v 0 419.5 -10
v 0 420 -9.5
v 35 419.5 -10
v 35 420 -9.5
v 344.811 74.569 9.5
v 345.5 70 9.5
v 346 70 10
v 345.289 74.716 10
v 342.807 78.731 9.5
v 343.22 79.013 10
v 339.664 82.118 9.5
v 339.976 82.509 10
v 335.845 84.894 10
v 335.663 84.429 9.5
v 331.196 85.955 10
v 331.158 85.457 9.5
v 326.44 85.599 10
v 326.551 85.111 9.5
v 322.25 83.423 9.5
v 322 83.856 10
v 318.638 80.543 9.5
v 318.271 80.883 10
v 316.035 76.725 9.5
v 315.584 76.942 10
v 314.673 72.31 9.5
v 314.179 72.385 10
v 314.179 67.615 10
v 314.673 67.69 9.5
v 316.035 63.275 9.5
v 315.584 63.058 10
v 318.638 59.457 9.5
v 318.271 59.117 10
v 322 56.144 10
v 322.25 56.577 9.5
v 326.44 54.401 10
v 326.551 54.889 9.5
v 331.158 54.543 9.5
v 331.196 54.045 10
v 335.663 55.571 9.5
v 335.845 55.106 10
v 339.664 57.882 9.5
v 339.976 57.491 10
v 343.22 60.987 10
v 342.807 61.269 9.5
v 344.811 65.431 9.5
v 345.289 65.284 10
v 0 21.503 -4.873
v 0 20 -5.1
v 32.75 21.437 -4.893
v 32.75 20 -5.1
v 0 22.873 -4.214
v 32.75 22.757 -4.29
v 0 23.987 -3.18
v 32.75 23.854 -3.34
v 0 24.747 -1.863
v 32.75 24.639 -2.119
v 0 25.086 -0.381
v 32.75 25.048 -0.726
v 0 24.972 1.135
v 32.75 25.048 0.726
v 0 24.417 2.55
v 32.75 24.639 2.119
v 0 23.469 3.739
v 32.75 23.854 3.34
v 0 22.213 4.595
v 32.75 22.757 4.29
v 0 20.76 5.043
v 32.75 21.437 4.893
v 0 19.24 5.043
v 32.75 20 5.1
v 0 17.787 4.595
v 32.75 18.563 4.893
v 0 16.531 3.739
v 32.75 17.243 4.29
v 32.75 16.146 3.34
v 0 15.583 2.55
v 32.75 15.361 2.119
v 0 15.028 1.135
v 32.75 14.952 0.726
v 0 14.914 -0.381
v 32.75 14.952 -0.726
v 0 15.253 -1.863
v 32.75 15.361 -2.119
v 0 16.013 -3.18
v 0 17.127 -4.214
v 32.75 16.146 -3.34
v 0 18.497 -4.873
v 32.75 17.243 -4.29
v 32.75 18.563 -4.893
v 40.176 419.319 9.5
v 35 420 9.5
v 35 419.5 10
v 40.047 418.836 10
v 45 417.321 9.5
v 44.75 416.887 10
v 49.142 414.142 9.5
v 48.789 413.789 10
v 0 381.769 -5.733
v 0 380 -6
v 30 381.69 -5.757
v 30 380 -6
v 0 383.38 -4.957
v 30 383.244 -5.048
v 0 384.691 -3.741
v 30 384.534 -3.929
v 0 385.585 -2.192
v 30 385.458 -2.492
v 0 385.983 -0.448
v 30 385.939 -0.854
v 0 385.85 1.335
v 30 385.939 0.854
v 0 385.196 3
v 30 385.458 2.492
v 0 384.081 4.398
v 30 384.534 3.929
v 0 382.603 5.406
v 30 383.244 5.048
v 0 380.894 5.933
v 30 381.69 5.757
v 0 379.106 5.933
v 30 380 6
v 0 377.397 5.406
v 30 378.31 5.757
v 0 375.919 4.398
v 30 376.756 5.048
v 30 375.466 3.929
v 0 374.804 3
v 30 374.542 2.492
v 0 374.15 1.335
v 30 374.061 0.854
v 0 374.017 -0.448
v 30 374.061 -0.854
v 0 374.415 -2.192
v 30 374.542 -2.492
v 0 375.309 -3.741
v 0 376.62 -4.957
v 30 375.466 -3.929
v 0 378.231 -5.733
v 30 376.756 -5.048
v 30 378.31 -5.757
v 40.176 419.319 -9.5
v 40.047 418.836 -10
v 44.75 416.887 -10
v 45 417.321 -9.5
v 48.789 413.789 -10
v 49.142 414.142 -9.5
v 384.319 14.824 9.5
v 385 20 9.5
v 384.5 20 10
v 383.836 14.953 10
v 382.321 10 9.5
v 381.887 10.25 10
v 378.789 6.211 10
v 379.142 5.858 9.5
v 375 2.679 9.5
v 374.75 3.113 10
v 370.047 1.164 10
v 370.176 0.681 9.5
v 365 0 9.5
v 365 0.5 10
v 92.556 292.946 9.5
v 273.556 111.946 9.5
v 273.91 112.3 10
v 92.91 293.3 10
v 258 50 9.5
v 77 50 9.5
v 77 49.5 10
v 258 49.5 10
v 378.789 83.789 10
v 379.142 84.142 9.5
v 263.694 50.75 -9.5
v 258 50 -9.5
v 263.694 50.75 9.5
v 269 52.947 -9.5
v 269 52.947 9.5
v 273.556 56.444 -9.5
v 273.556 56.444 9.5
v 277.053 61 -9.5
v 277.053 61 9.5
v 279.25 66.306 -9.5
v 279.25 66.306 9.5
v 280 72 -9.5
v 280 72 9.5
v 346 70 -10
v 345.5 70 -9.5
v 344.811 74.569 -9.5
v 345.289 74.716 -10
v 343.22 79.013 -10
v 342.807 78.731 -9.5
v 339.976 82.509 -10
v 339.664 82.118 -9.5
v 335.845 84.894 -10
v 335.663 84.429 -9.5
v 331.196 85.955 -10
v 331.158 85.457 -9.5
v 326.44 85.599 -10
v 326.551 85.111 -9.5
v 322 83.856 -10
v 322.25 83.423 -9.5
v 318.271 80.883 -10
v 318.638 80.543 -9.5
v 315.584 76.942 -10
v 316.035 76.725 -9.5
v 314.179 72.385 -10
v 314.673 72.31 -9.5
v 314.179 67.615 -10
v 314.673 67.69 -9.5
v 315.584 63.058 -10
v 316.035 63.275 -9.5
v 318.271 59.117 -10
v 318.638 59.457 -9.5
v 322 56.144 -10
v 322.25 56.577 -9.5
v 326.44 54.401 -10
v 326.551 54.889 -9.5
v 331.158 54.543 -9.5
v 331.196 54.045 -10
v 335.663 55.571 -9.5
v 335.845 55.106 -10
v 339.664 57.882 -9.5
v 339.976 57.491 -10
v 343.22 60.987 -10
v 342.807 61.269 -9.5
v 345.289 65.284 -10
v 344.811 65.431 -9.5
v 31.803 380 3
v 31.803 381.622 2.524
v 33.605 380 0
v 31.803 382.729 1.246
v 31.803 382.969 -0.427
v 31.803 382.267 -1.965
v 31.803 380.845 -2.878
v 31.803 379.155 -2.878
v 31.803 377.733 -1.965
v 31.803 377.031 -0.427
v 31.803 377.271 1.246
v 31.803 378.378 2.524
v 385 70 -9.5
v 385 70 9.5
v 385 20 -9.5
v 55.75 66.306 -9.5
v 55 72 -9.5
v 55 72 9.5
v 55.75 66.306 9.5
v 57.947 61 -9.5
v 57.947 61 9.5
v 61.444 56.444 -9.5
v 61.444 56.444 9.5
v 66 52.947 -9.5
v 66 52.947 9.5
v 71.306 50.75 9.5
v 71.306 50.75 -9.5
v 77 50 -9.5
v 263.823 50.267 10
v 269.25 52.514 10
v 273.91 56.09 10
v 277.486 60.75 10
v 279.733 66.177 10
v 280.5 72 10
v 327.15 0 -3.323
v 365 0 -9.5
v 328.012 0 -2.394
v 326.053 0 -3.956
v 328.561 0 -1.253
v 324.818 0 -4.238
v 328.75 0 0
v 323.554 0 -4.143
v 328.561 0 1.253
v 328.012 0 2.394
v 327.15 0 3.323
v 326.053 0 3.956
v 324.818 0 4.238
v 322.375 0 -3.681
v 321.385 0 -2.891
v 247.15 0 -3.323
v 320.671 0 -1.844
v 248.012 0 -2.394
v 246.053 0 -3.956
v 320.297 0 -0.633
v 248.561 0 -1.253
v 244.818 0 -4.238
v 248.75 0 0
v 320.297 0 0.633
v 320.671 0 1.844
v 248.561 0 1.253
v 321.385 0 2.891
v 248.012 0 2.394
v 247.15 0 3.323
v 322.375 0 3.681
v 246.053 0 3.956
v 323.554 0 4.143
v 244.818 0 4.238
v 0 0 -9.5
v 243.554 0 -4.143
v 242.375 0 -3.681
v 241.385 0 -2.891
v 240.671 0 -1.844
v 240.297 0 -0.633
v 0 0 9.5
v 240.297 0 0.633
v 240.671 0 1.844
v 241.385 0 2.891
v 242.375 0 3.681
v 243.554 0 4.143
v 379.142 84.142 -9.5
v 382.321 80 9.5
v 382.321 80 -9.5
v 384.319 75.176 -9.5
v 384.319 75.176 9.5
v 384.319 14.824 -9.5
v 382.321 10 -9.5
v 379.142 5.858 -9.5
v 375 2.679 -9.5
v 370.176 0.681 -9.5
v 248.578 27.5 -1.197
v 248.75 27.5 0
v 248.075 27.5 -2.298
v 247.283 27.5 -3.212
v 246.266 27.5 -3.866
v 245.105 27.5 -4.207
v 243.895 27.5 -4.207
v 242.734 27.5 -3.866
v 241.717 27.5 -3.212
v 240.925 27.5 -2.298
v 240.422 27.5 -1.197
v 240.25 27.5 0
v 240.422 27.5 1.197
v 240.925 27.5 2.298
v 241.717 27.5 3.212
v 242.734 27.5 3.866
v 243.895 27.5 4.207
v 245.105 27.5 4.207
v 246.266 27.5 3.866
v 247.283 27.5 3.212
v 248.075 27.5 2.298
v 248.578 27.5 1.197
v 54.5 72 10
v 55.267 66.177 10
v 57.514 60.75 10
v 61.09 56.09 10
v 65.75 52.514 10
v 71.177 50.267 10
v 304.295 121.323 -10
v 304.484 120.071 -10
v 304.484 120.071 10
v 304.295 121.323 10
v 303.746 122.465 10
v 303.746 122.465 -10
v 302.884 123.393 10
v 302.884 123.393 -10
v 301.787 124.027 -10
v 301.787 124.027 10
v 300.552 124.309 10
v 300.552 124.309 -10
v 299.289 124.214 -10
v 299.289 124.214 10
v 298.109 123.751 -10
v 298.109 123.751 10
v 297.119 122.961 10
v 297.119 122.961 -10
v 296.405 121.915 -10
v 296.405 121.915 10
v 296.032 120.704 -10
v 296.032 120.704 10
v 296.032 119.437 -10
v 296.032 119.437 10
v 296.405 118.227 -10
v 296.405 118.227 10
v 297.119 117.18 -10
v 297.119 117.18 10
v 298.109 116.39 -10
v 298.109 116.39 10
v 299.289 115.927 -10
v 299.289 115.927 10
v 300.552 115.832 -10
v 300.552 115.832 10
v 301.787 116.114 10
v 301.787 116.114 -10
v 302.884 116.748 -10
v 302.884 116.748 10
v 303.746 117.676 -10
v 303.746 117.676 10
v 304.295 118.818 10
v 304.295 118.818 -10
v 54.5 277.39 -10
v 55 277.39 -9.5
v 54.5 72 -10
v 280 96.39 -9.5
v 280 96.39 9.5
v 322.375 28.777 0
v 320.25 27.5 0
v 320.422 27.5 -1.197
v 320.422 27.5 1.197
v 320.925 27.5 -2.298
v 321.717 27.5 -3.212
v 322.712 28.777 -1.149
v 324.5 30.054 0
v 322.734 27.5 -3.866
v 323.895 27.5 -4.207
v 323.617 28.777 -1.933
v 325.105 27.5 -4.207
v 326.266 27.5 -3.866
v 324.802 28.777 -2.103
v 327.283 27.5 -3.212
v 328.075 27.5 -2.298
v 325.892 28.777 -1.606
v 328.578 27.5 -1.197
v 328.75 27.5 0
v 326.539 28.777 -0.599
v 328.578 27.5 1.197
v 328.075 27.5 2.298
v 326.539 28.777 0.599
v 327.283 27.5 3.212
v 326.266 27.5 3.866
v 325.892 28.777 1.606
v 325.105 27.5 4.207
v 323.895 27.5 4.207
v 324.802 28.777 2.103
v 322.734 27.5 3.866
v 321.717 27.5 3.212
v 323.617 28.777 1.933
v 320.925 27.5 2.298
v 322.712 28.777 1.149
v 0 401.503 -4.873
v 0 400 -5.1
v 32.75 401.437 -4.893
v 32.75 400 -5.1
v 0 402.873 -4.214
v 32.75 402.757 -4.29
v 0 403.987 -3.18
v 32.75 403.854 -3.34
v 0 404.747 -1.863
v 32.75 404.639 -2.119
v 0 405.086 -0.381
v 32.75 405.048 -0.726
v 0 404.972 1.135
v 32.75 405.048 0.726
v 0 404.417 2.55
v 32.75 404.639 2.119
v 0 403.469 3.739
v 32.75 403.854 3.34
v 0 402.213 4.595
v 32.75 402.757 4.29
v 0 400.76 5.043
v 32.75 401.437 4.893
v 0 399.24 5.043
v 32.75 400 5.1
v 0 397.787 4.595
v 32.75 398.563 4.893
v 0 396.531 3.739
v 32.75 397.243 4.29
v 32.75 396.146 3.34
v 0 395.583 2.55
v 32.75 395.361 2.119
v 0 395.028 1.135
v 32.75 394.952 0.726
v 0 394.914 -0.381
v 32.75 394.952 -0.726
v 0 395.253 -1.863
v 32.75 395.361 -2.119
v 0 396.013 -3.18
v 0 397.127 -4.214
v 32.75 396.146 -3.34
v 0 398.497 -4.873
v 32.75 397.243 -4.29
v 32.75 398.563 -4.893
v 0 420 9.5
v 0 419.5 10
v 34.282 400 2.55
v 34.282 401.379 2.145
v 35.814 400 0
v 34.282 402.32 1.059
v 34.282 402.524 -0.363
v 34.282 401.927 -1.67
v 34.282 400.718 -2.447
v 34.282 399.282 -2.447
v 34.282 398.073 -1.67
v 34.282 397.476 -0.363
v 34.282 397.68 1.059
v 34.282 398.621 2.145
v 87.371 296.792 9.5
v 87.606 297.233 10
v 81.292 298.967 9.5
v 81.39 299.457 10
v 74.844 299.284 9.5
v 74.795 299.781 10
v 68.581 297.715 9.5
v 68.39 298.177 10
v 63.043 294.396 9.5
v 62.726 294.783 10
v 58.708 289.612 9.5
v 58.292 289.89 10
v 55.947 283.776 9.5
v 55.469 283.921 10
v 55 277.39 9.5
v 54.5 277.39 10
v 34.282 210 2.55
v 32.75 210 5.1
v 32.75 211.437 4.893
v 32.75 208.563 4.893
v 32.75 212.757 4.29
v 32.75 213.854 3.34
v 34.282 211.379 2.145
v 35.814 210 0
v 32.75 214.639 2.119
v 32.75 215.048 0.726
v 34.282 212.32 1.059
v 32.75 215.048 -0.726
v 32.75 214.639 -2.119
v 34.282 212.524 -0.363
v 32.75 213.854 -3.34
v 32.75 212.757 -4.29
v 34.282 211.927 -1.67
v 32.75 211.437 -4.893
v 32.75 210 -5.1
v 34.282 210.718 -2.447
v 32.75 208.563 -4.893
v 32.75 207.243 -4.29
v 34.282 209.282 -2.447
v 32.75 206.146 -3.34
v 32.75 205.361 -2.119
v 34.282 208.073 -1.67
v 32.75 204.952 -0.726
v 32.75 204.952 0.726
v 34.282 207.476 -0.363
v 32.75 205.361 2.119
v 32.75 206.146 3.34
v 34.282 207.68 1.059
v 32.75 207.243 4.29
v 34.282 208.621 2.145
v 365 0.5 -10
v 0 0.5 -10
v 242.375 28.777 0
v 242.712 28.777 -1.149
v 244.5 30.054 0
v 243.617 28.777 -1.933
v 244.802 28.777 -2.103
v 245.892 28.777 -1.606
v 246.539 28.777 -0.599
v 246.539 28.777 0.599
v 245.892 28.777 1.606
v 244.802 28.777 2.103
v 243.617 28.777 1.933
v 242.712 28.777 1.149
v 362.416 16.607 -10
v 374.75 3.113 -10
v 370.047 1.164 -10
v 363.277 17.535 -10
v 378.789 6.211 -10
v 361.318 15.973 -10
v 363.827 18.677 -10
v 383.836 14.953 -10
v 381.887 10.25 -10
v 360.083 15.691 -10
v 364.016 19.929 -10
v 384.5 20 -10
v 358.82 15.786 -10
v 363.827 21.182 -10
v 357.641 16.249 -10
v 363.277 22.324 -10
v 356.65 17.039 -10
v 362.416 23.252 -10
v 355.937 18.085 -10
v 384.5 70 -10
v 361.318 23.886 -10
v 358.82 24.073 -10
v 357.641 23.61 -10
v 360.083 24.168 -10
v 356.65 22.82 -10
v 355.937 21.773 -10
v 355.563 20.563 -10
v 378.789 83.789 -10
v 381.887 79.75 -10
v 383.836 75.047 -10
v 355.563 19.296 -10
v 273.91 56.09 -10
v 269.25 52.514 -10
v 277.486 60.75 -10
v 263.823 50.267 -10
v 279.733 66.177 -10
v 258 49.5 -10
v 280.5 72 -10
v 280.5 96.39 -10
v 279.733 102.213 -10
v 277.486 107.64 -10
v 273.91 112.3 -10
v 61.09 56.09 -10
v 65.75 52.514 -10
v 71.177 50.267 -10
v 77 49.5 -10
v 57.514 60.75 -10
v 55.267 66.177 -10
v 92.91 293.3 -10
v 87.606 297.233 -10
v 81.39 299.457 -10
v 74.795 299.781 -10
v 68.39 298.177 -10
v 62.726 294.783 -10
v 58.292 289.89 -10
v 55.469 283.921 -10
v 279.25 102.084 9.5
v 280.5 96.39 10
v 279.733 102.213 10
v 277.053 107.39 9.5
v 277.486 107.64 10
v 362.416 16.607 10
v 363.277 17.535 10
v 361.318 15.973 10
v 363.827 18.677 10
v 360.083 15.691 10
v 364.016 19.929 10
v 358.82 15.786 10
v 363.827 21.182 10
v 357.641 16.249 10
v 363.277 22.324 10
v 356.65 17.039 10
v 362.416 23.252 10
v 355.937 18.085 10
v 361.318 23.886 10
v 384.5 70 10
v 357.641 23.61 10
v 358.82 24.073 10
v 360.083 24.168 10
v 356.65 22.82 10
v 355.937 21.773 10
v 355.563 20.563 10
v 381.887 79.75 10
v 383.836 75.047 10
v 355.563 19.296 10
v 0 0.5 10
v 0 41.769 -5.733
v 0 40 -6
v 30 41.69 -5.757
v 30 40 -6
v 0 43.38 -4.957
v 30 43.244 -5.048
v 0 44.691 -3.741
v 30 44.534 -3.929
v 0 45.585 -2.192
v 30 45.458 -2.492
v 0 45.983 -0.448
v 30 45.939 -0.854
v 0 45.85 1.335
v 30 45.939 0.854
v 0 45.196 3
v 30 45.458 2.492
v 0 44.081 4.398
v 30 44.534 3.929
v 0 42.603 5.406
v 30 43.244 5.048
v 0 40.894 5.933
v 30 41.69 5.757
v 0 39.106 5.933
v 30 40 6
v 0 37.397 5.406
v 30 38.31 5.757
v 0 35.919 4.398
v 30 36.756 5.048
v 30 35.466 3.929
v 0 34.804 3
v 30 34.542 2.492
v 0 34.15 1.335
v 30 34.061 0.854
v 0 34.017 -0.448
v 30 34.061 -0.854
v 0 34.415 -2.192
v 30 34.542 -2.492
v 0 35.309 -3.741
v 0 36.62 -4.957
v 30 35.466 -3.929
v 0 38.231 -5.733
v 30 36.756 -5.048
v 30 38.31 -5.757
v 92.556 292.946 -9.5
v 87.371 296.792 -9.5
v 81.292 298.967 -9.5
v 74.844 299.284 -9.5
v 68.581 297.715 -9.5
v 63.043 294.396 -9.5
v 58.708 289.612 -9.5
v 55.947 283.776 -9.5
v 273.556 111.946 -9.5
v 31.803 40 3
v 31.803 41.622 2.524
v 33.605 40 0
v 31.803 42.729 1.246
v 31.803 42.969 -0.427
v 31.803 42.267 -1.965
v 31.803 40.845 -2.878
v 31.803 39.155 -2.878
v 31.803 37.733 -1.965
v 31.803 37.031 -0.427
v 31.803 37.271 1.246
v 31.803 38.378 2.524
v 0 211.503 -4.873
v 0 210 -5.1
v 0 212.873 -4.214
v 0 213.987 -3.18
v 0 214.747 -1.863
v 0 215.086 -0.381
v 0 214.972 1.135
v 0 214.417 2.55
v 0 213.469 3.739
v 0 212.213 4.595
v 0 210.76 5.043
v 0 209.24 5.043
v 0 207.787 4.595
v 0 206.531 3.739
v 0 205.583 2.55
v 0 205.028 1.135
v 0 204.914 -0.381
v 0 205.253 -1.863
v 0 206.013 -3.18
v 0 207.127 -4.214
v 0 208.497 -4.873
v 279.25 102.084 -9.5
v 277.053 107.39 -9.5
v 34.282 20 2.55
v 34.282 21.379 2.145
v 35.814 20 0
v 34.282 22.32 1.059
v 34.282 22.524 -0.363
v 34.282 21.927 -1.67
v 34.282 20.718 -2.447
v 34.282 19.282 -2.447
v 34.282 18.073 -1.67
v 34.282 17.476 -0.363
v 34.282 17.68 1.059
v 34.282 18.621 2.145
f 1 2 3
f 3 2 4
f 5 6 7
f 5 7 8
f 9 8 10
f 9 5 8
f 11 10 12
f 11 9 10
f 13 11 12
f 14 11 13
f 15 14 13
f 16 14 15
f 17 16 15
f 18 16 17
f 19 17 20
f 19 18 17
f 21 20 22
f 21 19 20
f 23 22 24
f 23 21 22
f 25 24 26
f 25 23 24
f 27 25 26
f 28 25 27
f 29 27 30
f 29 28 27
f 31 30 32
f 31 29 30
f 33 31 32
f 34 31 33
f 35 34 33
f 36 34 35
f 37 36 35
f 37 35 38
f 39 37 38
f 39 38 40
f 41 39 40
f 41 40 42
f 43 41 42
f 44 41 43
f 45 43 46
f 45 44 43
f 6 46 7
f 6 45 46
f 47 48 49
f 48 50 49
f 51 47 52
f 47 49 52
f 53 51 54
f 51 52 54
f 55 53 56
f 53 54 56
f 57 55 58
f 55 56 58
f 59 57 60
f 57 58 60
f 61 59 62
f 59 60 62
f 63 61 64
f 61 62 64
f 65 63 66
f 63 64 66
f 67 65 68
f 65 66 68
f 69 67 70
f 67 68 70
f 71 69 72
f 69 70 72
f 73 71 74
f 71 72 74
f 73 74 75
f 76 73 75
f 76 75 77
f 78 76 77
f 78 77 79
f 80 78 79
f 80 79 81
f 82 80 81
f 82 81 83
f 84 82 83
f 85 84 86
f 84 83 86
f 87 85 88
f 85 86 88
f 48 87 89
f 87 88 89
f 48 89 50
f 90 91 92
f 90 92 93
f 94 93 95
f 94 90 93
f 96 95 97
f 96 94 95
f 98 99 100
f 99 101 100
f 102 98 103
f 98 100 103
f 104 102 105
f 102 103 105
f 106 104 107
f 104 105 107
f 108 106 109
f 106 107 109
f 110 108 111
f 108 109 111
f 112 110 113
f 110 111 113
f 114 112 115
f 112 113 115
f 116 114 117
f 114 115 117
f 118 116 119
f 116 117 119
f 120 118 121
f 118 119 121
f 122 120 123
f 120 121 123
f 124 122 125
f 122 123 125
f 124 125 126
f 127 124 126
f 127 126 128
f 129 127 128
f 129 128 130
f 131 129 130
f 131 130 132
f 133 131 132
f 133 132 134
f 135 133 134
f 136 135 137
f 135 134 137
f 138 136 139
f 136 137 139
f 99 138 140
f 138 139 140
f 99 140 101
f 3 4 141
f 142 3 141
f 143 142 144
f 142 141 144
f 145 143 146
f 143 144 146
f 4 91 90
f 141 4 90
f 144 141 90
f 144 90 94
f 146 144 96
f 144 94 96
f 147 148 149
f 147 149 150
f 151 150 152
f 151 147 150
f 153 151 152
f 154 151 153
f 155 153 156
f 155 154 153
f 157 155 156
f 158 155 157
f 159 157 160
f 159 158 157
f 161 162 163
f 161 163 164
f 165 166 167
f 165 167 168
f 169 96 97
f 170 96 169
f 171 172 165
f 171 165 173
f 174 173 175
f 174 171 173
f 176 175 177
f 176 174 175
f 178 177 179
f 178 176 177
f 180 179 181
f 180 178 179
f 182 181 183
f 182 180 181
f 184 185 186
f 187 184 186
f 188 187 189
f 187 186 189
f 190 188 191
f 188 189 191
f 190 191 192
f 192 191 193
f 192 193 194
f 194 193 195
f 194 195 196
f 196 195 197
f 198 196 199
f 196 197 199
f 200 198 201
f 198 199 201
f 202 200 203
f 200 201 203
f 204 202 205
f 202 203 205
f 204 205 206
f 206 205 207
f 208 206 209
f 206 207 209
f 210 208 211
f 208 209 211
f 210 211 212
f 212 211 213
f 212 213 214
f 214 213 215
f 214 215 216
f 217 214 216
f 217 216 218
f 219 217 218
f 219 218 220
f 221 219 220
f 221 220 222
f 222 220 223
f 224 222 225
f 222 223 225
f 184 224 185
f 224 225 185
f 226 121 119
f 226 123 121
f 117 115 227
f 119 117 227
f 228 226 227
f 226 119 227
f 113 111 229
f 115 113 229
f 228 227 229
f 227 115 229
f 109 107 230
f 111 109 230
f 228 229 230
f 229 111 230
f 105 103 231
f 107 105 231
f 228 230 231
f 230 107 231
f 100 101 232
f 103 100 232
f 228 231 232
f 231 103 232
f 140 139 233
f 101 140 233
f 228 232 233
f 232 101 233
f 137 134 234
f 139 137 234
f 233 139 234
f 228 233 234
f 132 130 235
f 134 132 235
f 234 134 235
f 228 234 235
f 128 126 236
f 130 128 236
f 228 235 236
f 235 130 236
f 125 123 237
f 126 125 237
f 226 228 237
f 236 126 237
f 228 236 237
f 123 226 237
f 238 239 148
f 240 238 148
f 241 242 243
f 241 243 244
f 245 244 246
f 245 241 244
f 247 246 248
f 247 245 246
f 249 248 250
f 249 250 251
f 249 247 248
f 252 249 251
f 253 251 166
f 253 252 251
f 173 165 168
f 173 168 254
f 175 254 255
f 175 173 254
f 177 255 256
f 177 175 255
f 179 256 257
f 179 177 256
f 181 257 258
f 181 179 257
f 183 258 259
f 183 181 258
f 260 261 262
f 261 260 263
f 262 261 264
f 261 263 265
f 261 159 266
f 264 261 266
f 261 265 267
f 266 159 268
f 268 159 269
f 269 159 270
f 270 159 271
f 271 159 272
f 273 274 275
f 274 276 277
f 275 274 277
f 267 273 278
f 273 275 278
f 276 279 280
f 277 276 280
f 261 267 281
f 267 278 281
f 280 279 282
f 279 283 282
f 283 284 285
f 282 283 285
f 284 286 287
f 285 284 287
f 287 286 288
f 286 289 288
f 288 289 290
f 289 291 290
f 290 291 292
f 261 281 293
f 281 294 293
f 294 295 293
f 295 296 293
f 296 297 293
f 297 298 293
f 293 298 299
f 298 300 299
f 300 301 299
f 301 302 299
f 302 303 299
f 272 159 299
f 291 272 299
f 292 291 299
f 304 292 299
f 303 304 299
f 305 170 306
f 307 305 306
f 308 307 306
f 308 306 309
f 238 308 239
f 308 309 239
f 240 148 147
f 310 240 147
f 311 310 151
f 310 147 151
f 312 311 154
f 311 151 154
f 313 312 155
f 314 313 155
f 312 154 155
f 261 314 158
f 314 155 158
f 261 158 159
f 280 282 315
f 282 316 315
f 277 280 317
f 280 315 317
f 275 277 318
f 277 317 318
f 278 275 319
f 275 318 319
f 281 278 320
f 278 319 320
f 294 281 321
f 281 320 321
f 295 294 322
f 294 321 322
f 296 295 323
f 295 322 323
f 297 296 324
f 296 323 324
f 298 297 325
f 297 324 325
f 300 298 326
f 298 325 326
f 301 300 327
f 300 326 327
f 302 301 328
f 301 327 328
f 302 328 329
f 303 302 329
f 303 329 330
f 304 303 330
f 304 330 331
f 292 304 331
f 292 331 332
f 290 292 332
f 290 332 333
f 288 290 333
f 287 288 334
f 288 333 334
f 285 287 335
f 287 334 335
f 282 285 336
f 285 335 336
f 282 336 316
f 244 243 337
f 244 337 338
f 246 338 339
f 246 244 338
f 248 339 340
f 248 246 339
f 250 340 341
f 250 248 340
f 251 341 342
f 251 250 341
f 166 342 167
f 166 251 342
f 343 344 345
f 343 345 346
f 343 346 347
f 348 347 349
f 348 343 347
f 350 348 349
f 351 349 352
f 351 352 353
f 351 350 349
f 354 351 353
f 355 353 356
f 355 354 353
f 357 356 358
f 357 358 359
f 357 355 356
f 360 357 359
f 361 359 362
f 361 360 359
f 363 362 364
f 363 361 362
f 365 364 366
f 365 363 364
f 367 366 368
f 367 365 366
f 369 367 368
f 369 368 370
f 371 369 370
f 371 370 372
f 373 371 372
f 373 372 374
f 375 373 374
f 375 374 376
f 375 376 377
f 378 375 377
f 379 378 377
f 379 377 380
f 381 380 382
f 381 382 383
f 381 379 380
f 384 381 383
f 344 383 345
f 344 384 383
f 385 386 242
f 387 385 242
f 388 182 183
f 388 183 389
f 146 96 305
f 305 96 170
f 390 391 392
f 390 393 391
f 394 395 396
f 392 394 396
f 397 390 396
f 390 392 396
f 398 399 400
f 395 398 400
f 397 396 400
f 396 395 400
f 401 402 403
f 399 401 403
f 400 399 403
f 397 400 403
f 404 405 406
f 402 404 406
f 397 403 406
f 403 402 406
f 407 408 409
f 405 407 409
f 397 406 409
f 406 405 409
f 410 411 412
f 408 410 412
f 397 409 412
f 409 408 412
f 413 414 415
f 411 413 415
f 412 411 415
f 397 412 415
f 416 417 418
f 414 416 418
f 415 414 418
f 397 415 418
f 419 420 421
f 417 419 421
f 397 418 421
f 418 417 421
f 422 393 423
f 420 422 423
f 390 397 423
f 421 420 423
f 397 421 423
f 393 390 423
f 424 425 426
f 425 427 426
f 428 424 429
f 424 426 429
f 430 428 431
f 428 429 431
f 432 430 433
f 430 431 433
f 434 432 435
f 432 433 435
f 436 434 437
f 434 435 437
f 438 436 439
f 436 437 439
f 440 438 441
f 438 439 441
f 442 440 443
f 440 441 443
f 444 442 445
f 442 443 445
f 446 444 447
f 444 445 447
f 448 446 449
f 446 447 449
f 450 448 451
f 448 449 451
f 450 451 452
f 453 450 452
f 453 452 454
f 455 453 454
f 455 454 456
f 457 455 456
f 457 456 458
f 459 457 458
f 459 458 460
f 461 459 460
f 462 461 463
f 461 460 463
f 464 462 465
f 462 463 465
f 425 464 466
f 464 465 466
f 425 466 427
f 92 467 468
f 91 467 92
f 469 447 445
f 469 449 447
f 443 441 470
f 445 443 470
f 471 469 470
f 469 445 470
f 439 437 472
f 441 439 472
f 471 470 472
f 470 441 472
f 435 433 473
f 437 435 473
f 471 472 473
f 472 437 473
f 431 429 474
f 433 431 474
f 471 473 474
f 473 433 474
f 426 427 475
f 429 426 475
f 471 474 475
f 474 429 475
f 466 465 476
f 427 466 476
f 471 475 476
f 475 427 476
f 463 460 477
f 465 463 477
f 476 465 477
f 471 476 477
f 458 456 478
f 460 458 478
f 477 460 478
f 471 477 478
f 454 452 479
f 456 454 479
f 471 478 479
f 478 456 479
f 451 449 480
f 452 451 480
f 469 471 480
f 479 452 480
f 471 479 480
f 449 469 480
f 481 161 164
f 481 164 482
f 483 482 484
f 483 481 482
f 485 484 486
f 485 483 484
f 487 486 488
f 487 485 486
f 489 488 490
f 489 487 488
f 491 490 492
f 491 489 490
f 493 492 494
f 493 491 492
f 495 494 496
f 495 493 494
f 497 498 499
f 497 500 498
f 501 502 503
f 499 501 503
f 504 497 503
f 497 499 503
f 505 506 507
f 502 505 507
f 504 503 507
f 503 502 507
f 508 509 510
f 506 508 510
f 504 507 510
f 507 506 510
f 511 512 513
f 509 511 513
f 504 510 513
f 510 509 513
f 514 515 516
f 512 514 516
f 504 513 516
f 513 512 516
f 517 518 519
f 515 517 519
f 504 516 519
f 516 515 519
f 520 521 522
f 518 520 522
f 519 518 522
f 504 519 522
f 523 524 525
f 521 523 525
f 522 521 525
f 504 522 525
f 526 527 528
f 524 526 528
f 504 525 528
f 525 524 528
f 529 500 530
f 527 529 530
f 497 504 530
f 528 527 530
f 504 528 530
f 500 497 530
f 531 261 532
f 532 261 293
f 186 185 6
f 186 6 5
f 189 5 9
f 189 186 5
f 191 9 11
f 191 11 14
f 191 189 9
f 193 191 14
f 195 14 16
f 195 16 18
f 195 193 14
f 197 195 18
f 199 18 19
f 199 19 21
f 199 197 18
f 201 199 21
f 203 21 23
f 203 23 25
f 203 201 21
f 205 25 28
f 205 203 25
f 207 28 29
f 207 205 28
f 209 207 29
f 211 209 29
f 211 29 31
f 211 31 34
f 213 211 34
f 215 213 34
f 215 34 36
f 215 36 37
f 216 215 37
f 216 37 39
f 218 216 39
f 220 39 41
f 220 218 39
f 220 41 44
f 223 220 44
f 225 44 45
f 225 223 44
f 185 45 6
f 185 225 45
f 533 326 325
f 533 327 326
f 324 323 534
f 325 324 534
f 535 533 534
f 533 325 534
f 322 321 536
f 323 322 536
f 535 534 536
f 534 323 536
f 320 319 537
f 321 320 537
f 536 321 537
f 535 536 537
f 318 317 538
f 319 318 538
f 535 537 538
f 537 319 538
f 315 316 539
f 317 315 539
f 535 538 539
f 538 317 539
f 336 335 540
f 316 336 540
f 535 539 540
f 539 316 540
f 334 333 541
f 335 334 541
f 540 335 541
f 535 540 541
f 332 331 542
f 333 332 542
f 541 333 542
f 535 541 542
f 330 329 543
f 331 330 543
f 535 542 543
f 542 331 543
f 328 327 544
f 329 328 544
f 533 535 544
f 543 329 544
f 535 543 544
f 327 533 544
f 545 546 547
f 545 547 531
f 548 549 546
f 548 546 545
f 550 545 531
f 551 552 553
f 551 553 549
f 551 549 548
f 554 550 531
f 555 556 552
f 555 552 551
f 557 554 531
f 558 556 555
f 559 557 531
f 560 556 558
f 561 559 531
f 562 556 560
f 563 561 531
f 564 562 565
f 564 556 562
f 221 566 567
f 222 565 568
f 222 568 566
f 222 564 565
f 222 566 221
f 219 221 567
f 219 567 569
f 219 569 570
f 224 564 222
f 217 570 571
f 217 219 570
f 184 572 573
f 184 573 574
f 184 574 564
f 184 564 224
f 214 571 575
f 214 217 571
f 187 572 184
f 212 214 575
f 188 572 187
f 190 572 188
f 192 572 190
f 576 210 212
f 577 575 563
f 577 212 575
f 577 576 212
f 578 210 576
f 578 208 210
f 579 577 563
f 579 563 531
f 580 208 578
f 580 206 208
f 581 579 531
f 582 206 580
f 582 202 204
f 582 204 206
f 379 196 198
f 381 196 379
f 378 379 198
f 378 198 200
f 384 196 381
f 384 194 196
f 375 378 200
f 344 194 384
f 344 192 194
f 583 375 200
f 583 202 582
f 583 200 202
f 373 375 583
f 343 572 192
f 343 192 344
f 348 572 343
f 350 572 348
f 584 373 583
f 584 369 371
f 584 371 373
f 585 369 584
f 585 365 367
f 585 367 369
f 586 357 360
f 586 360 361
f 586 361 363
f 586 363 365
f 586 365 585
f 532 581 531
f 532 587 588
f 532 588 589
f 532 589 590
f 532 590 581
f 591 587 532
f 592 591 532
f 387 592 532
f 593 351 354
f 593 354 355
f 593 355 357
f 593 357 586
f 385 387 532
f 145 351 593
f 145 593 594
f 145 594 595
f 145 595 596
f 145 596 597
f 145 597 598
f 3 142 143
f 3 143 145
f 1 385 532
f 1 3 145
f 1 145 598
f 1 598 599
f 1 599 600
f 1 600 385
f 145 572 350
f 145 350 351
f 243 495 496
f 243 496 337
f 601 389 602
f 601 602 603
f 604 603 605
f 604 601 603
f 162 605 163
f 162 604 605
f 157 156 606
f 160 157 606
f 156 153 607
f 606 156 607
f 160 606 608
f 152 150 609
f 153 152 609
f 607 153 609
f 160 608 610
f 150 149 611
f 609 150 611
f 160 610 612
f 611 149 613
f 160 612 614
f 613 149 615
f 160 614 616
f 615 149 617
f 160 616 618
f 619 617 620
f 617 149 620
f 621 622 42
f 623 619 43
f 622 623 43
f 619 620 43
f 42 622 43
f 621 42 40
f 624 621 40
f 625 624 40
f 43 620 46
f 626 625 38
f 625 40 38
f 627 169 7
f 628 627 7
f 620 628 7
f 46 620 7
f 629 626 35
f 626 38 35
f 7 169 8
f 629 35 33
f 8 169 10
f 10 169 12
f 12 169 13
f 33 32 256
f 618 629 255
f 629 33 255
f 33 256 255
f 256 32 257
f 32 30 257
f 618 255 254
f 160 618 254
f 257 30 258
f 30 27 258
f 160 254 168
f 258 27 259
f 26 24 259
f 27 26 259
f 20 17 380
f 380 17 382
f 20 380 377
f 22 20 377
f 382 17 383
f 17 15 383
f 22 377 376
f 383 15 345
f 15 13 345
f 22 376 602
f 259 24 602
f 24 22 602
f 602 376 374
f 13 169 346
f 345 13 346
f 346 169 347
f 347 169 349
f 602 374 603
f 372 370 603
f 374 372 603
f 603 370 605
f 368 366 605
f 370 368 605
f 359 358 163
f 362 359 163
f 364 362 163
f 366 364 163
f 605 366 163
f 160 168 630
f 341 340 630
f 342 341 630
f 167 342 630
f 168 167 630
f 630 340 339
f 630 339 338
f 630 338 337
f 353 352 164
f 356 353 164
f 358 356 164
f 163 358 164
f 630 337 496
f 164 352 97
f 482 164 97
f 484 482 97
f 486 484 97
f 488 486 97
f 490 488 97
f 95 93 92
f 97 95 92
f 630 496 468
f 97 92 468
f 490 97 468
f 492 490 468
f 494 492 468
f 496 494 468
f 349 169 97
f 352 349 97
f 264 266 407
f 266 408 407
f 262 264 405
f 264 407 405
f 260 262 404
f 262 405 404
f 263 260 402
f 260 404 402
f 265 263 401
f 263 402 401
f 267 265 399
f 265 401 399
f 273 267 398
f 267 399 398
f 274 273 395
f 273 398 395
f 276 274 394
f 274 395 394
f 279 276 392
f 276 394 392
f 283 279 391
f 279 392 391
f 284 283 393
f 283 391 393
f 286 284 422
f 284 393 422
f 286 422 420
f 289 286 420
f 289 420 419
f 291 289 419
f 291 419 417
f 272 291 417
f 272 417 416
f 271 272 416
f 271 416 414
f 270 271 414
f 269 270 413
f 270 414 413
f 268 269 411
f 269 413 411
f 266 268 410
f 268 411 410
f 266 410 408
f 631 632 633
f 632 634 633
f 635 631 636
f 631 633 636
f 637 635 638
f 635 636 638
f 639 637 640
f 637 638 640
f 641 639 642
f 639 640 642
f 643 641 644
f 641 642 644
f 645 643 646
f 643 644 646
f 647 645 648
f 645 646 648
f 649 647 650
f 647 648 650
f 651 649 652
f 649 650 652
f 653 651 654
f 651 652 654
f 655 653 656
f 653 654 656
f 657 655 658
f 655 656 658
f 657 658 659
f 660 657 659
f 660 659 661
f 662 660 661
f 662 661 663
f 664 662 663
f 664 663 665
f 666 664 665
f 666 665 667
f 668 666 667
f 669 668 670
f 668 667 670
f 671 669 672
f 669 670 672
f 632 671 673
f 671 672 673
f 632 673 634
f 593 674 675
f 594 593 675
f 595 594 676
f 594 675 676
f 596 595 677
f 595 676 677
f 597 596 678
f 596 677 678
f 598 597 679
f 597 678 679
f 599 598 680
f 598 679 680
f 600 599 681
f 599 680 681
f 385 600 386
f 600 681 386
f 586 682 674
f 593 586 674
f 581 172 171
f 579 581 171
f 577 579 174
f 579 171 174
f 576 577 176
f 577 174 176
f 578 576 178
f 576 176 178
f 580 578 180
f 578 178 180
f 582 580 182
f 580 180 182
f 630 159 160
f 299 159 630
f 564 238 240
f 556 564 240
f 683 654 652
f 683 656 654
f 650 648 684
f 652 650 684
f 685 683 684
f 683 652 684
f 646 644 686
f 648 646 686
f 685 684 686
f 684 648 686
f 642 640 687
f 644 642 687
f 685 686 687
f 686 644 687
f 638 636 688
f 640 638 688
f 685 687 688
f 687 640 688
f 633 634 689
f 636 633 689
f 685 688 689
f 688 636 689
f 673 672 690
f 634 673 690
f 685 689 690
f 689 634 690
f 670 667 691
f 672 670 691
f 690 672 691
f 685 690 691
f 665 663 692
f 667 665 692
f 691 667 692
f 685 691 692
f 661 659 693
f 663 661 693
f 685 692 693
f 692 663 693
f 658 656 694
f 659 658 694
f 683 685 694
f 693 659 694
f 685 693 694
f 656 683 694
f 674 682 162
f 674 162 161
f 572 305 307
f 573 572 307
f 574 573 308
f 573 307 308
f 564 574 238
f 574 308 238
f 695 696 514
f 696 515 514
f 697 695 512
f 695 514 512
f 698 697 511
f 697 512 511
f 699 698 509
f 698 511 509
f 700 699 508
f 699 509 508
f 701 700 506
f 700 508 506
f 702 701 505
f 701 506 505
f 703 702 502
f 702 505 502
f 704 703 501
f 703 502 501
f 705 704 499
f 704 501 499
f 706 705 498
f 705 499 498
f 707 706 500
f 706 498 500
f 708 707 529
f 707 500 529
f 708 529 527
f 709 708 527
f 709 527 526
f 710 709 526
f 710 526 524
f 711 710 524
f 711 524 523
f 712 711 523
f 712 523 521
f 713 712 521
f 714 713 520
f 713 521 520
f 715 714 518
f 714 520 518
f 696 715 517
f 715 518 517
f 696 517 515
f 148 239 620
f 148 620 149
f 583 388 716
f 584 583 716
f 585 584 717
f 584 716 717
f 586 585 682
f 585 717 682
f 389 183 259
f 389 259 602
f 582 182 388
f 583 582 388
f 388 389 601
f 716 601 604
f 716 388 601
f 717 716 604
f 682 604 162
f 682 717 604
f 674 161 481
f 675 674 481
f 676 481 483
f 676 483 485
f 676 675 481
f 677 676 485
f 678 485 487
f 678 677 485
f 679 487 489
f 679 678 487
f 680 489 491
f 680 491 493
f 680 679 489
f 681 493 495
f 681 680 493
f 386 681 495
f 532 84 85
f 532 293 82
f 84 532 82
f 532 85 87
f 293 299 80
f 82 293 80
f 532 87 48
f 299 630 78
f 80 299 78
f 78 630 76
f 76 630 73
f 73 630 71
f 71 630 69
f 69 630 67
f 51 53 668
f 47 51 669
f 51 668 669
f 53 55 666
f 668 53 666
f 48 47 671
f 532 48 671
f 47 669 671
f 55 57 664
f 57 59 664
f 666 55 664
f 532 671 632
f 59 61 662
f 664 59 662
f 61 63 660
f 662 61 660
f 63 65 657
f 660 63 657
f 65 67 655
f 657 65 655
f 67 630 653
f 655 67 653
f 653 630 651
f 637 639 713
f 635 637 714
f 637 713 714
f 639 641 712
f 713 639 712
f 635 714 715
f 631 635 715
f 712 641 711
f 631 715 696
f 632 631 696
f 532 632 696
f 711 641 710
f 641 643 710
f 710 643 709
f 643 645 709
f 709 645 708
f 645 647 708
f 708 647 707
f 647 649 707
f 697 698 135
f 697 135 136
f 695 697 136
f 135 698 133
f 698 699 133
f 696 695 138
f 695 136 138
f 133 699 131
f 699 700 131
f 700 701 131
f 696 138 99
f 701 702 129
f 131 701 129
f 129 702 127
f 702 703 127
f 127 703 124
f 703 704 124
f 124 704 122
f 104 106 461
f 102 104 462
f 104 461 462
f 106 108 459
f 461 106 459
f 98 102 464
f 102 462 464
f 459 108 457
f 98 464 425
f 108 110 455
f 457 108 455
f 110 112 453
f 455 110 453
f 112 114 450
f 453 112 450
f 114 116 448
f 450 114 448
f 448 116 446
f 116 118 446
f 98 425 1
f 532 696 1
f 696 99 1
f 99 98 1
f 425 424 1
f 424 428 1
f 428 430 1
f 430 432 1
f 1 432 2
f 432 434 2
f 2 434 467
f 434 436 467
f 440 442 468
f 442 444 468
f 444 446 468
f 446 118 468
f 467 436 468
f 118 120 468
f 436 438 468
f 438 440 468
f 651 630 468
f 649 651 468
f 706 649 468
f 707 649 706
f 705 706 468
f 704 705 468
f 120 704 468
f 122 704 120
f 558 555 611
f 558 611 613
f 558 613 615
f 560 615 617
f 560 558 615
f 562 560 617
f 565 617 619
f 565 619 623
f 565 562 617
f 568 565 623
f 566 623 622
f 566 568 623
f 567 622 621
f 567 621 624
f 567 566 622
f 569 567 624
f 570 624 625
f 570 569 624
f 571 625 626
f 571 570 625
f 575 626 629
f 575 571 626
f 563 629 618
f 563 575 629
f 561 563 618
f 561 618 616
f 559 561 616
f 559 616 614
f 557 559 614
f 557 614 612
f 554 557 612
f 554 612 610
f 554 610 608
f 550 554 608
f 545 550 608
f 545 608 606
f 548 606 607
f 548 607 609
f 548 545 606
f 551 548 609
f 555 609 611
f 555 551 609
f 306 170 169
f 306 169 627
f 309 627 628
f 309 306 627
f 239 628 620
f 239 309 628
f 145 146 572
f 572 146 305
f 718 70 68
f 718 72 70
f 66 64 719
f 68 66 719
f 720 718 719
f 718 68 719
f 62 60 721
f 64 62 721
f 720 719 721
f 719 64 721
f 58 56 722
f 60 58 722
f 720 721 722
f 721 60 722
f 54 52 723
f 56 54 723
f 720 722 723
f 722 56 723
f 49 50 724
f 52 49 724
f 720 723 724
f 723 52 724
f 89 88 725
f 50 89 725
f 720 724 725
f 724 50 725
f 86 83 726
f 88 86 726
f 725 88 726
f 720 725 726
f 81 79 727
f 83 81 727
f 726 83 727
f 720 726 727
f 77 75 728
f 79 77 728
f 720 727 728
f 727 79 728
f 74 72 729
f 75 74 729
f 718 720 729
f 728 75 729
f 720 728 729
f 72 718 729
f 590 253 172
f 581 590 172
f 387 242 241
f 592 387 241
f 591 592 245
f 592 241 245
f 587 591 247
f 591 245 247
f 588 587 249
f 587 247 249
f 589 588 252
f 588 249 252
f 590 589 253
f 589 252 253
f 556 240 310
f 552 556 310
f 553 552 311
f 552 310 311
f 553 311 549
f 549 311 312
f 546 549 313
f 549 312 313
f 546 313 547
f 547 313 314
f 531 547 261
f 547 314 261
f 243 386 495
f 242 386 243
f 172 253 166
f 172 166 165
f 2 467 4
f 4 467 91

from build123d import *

# Parameters (mm, degrees)
AUFSATZ_LINEAR_AUSTRAGEN1_DEPTH      = 10
F_12_0_12_DURCHMESSER_BOHRUNG1_D     = 12
F_12_0_12_DURCHMESSER_BOHRUNG1_DEPTH = 30
F_12_0_12_DURCHMESSER_BOHRUNG1_TIP   = 3.605163714
M12_GEWINDEBOHRUNG1_D                = 10.2
M12_GEWINDEBOHRUNG1_DEPTH            = 32.75
M12_GEWINDEBOHRUNG1_TIP              = 3.064389157
SCHNITT_LINEAR_START                 = -10
SCHNITT_LINEAR_AUSTRAGEN1_OUTLINE_R  = 15.5
SCHNITT_LINEAR_AUSTRAGEN1_DEPTH      = 20
M10_START                            = -10
M10_GEWINDEBOHRUNG1_OUTLINE_R        = 4.25
M10_GEWINDEBOHRUNG1_DEPTH            = 20
M10_GEWINDEBOHRUNG2_D                = 8.5
M10_GEWINDEBOHRUNG2_DEPTH            = 27.5
M10_GEWINDEBOHRUNG2_TIP              = 2.553657631
FASE1_SIZE                           = 0.5


# Read off the part's stored shape, not the designer's step: Schnitt-Linear austragen1, M10 Gewindebohrung1
with BuildPart() as part:
    # Skizze1 → Aufsatz-Linear austragen1 (new, symmetric)
    with BuildSketch(Plane.XY):
        with BuildLine():
            Line((0, 0), (0, 420))
            Line((0, 420), (35, 420))
            ThreePointArc((35, 420), (42.653668647, 418.47759065), (49.142135624, 414.142135624))
            Line((49.142135624, 414.142135624), (379.142135624, 84.142135624))
            ThreePointArc((379.142135624, 84.142135624), (383.47759065, 77.653668647), (385, 70))
            Line((385, 70), (385, 20))
            ThreePointArc((385, 20), (379.142135624, 5.857864376), (365, 0))
            Line((365, 0), (0, 0))
        make_face()
    extrude(amount=AUFSATZ_LINEAR_AUSTRAGEN1_DEPTH, both=True)

    # Ø12.0 (12) Durchmesser Bohrung1
    with Locations(Plane.ZY):
        with Locations((0, 40), (0, 380)):
            Hole(F_12_0_12_DURCHMESSER_BOHRUNG1_D / 2, depth=F_12_0_12_DURCHMESSER_BOHRUNG1_DEPTH)
            with Locations((0, 0, -(F_12_0_12_DURCHMESSER_BOHRUNG1_DEPTH + F_12_0_12_DURCHMESSER_BOHRUNG1_TIP / 2))):  # 118° drill point
                Cone(0, F_12_0_12_DURCHMESSER_BOHRUNG1_D / 2, F_12_0_12_DURCHMESSER_BOHRUNG1_TIP, mode=Mode.SUBTRACT)

    # M12 Gewindebohrung1
    with Locations(Plane.ZY):
        with Locations((0, 20), (0, 210), (0, 400)):
            Hole(M12_GEWINDEBOHRUNG1_D / 2, depth=M12_GEWINDEBOHRUNG1_DEPTH)
            with Locations((0, 0, -(M12_GEWINDEBOHRUNG1_DEPTH + M12_GEWINDEBOHRUNG1_TIP / 2))):  # 118° drill point
                Cone(0, M12_GEWINDEBOHRUNG1_D / 2, M12_GEWINDEBOHRUNG1_TIP, mode=Mode.SUBTRACT)

    # Schnitt-Linear austragen1 outline → Schnitt-Linear austragen1 (cut)
    with BuildSketch(Plane.XY.offset(SCHNITT_LINEAR_START)):
        with BuildLine():
            Line((55, 277.389826945), (55, 72))
            ThreePointArc((55, 72), (61.443650814, 56.443650814), (77, 50))
            Line((77, 50), (258, 50))
            ThreePointArc((258, 50), (273.556349186, 56.443650814), (280, 72))
            Line((280, 72), (280, 96.389826945))
            ThreePointArc((280, 96.389826945), (278.325349715, 104.808862457), (273.556349186, 111.946176131))
            Line((273.556349186, 111.946176131), (92.556349186, 292.946176131))
            ThreePointArc((92.556349186, 292.946176131), (68.580964488, 297.71517666), (55, 277.389826945))
        make_face()
        with Locations((330, 70)):
            Circle(SCHNITT_LINEAR_AUSTRAGEN1_OUTLINE_R)
    extrude(amount=SCHNITT_LINEAR_AUSTRAGEN1_DEPTH, mode=Mode.SUBTRACT)

    # M10 Gewindebohrung1 outline → M10 Gewindebohrung1 (cut)
    with BuildSketch(Plane.XY.offset(M10_START)):
        with Locations((300.234254829, 120.07057933)):
            Circle(M10_GEWINDEBOHRUNG1_OUTLINE_R)
        with Locations((359.765745171, 19.92942067)):
            Circle(M10_GEWINDEBOHRUNG1_OUTLINE_R)
    extrude(amount=M10_GEWINDEBOHRUNG1_DEPTH, mode=Mode.SUBTRACT)

    # M10 Gewindebohrung2
    with Locations(Plane(origin=(0, 0, 0), x_dir=(-1, 0, 0), z_dir=(0, -1, 0))):
        with Locations((-324.5, 0), (-244.5, 0)):
            Hole(M10_GEWINDEBOHRUNG2_D / 2, depth=M10_GEWINDEBOHRUNG2_DEPTH)
            with Locations((0, 0, -(M10_GEWINDEBOHRUNG2_DEPTH + M10_GEWINDEBOHRUNG2_TIP / 2))):  # 118° drill point
                Cone(0, M10_GEWINDEBOHRUNG2_D / 2, M10_GEWINDEBOHRUNG2_TIP, mode=Mode.SUBTRACT)

    # Fase1
    fase1_edges = [part.edges().sort_by_distance(p)[0] for p in [
        (385, 45, 10),
        (379.142135624, 5.857864376, -10),
        (182.5, 0, -10),
        (383.47759065, 77.653668647, 10),
        (214.142135624, 249.142135624, 10),
        (42.653668647, 418.47759065, 10),
        (17.5, 420, 10),
        (182.5, 0, 10),
        (61.443650814, 56.443650814, -10),
        (55, 174.694913472, -10),
        (68.580964488, 297.71517666, -10),
        (183.056349186, 202.446176131, -10),
        (278.325349715, 104.808862457, -10),
        (280, 84.194913472, -10),
        (273.556349186, 56.443650814, -10),
        (167.5, 50, -10),
        (61.443650814, 56.443650814, 10),
        (167.5, 50, 10),
        (273.556349186, 56.443650814, 10),
        (280, 84.194913472, 10),
        (278.325349715, 104.808862457, 10),
        (183.056349186, 202.446176131, 10),
        (68.580964488, 297.71517666, 10),
        (55, 174.694913472, 10),
        (379.142135624, 5.857864376, 10),
        (314.5, 70, -10),
        (314.5, 70, 10),
        (17.5, 420, -10),
        (42.653668647, 418.47759065, -10),
        (214.142135624, 249.142135624, -10),
        (383.47759065, 77.653668647, -10),
        (385, 45, -10),
    ]]
    chamfer(fase1_edges, length=FASE1_SIZE)


solid = part.part
